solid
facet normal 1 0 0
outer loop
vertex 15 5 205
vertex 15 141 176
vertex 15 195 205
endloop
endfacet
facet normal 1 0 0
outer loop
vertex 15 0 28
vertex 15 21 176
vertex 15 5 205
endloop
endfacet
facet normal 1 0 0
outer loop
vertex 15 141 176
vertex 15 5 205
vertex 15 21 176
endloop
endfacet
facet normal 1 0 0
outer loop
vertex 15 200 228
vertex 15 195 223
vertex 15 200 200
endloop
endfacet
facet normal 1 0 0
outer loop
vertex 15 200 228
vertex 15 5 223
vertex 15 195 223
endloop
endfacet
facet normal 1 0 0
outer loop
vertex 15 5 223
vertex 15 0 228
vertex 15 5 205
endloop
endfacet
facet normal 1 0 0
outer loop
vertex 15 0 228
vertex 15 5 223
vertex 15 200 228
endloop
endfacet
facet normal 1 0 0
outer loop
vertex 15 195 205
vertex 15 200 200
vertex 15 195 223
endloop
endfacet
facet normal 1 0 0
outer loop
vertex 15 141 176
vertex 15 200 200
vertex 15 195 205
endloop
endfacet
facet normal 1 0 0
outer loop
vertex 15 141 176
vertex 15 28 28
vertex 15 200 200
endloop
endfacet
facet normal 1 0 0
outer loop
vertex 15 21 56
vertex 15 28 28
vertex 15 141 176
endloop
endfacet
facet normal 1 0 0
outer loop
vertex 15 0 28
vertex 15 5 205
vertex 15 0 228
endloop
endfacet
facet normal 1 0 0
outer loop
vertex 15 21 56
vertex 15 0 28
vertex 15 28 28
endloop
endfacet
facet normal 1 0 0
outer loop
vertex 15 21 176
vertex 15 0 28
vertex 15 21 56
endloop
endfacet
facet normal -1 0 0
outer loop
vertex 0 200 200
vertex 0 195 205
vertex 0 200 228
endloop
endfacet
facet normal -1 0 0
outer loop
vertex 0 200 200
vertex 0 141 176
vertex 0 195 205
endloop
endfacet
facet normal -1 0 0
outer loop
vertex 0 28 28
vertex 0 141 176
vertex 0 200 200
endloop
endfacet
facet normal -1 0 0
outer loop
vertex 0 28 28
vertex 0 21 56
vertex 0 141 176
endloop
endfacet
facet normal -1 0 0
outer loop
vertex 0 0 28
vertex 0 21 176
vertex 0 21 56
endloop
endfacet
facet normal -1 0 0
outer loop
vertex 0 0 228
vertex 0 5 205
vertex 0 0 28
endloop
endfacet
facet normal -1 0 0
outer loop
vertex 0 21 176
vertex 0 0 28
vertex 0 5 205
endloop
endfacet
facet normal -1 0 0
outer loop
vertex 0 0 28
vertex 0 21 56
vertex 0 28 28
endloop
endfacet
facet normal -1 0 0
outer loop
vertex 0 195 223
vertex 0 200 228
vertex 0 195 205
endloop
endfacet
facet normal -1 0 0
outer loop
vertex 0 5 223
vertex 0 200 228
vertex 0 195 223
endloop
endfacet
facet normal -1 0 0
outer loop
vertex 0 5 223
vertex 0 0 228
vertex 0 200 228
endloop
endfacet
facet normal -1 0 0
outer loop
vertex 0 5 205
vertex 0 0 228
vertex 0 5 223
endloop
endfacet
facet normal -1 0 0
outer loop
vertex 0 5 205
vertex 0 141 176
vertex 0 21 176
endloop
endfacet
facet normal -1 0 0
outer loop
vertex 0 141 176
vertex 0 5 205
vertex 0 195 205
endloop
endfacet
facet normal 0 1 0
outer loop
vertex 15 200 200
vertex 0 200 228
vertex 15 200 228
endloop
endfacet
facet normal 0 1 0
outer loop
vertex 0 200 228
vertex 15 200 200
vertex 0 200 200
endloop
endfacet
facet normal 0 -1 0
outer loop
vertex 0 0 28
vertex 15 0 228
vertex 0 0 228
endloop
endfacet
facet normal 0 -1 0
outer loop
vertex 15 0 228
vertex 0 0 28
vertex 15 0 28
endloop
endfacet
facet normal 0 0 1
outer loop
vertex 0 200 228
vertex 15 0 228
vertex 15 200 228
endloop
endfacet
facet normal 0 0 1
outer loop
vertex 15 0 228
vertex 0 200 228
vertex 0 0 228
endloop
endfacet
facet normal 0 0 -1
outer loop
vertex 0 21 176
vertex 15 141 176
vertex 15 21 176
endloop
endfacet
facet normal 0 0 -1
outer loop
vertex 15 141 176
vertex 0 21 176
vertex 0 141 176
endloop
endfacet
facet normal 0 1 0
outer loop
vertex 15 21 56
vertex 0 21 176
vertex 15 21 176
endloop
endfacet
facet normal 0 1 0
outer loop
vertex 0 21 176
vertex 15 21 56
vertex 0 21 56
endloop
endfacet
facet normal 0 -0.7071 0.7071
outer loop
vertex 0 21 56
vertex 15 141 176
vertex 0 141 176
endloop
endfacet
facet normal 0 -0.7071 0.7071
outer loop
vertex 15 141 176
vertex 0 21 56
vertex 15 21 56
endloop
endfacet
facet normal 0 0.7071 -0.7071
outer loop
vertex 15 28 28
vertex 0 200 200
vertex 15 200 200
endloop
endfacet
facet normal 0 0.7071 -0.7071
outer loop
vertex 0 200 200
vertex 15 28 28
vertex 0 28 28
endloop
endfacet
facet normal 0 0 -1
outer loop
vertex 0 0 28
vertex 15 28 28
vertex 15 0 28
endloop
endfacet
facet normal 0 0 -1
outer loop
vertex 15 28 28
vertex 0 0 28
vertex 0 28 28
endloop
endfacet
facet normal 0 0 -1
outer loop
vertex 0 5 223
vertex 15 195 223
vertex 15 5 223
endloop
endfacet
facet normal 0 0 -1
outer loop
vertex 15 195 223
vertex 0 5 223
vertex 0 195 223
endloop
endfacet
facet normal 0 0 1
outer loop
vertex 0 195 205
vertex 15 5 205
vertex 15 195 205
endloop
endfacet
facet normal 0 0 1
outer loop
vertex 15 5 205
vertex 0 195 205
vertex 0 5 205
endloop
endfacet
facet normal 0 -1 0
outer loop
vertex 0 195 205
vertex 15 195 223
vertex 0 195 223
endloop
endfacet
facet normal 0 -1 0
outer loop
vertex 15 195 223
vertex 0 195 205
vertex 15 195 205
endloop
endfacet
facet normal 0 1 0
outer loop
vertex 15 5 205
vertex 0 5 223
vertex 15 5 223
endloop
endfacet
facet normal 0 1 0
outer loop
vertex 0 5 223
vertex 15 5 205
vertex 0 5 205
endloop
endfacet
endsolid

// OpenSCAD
//wood size 18*200*xxx milimeters
woodHeight=18;
lenght=200;
height=lenght;

//shelf in mm
thickness=5;
width=15;
triangle=lenght-(lenght*30/100);

difference(){
    
    //horizontal
    union(){
        
       cube([width,lenght,height]);
       translate([0,0,height]) cube([width,lenght,woodHeight+2*thickness]);
            
    }
    //difference 45º
    translate([-width/2,0,0]) rotate([-45,0,0]) cube([width*2,lenght+2*thickness,height*thickness]);
    //difference cube down
    translate([-width/2,-width/2,0]) cube([width*2,woodHeight+4*thickness,woodHeight+2*thickness]);
    //slot wood
    translate([-width/2,thickness,height+thickness]) cube([width*2,lenght-2*thickness,woodHeight]);
    //triangulo interno
    translate([0,-width,width+thickness])
    difference(){
    translate ([-width/12,woodHeight*2,woodHeight*2]) cube([width+2,lenght-((lenght*40)/100),height-((height*40)/100)]);
    translate([-width/2,-woodHeight,-woodHeight]) rotate([-45,0,0]) cube([width*2,lenght+2*thickness,height*thickness]);
}
    
//rotate ([0,0,90])
//translate([woodHeight+2*thickness,width/2,50])
//polyhedron
//    (points = [
//	       [-thickness, -width*2, triangle], [0-thickness, 0, triangle], [-thickness, 0, 0], [-thickness, -width*2, 0], [140-thickness, -width*2, triangle], [140-thickness, 0, triangle]	       
//	       ], 
//     faces = [
//		  [0,3,2],  [0,2,1],  [4,0,5],  [5,0,1],  [5,2,4],  [4,2,3], [1,2,5], [0,3,4]     
//		  ]
//     );

}  
